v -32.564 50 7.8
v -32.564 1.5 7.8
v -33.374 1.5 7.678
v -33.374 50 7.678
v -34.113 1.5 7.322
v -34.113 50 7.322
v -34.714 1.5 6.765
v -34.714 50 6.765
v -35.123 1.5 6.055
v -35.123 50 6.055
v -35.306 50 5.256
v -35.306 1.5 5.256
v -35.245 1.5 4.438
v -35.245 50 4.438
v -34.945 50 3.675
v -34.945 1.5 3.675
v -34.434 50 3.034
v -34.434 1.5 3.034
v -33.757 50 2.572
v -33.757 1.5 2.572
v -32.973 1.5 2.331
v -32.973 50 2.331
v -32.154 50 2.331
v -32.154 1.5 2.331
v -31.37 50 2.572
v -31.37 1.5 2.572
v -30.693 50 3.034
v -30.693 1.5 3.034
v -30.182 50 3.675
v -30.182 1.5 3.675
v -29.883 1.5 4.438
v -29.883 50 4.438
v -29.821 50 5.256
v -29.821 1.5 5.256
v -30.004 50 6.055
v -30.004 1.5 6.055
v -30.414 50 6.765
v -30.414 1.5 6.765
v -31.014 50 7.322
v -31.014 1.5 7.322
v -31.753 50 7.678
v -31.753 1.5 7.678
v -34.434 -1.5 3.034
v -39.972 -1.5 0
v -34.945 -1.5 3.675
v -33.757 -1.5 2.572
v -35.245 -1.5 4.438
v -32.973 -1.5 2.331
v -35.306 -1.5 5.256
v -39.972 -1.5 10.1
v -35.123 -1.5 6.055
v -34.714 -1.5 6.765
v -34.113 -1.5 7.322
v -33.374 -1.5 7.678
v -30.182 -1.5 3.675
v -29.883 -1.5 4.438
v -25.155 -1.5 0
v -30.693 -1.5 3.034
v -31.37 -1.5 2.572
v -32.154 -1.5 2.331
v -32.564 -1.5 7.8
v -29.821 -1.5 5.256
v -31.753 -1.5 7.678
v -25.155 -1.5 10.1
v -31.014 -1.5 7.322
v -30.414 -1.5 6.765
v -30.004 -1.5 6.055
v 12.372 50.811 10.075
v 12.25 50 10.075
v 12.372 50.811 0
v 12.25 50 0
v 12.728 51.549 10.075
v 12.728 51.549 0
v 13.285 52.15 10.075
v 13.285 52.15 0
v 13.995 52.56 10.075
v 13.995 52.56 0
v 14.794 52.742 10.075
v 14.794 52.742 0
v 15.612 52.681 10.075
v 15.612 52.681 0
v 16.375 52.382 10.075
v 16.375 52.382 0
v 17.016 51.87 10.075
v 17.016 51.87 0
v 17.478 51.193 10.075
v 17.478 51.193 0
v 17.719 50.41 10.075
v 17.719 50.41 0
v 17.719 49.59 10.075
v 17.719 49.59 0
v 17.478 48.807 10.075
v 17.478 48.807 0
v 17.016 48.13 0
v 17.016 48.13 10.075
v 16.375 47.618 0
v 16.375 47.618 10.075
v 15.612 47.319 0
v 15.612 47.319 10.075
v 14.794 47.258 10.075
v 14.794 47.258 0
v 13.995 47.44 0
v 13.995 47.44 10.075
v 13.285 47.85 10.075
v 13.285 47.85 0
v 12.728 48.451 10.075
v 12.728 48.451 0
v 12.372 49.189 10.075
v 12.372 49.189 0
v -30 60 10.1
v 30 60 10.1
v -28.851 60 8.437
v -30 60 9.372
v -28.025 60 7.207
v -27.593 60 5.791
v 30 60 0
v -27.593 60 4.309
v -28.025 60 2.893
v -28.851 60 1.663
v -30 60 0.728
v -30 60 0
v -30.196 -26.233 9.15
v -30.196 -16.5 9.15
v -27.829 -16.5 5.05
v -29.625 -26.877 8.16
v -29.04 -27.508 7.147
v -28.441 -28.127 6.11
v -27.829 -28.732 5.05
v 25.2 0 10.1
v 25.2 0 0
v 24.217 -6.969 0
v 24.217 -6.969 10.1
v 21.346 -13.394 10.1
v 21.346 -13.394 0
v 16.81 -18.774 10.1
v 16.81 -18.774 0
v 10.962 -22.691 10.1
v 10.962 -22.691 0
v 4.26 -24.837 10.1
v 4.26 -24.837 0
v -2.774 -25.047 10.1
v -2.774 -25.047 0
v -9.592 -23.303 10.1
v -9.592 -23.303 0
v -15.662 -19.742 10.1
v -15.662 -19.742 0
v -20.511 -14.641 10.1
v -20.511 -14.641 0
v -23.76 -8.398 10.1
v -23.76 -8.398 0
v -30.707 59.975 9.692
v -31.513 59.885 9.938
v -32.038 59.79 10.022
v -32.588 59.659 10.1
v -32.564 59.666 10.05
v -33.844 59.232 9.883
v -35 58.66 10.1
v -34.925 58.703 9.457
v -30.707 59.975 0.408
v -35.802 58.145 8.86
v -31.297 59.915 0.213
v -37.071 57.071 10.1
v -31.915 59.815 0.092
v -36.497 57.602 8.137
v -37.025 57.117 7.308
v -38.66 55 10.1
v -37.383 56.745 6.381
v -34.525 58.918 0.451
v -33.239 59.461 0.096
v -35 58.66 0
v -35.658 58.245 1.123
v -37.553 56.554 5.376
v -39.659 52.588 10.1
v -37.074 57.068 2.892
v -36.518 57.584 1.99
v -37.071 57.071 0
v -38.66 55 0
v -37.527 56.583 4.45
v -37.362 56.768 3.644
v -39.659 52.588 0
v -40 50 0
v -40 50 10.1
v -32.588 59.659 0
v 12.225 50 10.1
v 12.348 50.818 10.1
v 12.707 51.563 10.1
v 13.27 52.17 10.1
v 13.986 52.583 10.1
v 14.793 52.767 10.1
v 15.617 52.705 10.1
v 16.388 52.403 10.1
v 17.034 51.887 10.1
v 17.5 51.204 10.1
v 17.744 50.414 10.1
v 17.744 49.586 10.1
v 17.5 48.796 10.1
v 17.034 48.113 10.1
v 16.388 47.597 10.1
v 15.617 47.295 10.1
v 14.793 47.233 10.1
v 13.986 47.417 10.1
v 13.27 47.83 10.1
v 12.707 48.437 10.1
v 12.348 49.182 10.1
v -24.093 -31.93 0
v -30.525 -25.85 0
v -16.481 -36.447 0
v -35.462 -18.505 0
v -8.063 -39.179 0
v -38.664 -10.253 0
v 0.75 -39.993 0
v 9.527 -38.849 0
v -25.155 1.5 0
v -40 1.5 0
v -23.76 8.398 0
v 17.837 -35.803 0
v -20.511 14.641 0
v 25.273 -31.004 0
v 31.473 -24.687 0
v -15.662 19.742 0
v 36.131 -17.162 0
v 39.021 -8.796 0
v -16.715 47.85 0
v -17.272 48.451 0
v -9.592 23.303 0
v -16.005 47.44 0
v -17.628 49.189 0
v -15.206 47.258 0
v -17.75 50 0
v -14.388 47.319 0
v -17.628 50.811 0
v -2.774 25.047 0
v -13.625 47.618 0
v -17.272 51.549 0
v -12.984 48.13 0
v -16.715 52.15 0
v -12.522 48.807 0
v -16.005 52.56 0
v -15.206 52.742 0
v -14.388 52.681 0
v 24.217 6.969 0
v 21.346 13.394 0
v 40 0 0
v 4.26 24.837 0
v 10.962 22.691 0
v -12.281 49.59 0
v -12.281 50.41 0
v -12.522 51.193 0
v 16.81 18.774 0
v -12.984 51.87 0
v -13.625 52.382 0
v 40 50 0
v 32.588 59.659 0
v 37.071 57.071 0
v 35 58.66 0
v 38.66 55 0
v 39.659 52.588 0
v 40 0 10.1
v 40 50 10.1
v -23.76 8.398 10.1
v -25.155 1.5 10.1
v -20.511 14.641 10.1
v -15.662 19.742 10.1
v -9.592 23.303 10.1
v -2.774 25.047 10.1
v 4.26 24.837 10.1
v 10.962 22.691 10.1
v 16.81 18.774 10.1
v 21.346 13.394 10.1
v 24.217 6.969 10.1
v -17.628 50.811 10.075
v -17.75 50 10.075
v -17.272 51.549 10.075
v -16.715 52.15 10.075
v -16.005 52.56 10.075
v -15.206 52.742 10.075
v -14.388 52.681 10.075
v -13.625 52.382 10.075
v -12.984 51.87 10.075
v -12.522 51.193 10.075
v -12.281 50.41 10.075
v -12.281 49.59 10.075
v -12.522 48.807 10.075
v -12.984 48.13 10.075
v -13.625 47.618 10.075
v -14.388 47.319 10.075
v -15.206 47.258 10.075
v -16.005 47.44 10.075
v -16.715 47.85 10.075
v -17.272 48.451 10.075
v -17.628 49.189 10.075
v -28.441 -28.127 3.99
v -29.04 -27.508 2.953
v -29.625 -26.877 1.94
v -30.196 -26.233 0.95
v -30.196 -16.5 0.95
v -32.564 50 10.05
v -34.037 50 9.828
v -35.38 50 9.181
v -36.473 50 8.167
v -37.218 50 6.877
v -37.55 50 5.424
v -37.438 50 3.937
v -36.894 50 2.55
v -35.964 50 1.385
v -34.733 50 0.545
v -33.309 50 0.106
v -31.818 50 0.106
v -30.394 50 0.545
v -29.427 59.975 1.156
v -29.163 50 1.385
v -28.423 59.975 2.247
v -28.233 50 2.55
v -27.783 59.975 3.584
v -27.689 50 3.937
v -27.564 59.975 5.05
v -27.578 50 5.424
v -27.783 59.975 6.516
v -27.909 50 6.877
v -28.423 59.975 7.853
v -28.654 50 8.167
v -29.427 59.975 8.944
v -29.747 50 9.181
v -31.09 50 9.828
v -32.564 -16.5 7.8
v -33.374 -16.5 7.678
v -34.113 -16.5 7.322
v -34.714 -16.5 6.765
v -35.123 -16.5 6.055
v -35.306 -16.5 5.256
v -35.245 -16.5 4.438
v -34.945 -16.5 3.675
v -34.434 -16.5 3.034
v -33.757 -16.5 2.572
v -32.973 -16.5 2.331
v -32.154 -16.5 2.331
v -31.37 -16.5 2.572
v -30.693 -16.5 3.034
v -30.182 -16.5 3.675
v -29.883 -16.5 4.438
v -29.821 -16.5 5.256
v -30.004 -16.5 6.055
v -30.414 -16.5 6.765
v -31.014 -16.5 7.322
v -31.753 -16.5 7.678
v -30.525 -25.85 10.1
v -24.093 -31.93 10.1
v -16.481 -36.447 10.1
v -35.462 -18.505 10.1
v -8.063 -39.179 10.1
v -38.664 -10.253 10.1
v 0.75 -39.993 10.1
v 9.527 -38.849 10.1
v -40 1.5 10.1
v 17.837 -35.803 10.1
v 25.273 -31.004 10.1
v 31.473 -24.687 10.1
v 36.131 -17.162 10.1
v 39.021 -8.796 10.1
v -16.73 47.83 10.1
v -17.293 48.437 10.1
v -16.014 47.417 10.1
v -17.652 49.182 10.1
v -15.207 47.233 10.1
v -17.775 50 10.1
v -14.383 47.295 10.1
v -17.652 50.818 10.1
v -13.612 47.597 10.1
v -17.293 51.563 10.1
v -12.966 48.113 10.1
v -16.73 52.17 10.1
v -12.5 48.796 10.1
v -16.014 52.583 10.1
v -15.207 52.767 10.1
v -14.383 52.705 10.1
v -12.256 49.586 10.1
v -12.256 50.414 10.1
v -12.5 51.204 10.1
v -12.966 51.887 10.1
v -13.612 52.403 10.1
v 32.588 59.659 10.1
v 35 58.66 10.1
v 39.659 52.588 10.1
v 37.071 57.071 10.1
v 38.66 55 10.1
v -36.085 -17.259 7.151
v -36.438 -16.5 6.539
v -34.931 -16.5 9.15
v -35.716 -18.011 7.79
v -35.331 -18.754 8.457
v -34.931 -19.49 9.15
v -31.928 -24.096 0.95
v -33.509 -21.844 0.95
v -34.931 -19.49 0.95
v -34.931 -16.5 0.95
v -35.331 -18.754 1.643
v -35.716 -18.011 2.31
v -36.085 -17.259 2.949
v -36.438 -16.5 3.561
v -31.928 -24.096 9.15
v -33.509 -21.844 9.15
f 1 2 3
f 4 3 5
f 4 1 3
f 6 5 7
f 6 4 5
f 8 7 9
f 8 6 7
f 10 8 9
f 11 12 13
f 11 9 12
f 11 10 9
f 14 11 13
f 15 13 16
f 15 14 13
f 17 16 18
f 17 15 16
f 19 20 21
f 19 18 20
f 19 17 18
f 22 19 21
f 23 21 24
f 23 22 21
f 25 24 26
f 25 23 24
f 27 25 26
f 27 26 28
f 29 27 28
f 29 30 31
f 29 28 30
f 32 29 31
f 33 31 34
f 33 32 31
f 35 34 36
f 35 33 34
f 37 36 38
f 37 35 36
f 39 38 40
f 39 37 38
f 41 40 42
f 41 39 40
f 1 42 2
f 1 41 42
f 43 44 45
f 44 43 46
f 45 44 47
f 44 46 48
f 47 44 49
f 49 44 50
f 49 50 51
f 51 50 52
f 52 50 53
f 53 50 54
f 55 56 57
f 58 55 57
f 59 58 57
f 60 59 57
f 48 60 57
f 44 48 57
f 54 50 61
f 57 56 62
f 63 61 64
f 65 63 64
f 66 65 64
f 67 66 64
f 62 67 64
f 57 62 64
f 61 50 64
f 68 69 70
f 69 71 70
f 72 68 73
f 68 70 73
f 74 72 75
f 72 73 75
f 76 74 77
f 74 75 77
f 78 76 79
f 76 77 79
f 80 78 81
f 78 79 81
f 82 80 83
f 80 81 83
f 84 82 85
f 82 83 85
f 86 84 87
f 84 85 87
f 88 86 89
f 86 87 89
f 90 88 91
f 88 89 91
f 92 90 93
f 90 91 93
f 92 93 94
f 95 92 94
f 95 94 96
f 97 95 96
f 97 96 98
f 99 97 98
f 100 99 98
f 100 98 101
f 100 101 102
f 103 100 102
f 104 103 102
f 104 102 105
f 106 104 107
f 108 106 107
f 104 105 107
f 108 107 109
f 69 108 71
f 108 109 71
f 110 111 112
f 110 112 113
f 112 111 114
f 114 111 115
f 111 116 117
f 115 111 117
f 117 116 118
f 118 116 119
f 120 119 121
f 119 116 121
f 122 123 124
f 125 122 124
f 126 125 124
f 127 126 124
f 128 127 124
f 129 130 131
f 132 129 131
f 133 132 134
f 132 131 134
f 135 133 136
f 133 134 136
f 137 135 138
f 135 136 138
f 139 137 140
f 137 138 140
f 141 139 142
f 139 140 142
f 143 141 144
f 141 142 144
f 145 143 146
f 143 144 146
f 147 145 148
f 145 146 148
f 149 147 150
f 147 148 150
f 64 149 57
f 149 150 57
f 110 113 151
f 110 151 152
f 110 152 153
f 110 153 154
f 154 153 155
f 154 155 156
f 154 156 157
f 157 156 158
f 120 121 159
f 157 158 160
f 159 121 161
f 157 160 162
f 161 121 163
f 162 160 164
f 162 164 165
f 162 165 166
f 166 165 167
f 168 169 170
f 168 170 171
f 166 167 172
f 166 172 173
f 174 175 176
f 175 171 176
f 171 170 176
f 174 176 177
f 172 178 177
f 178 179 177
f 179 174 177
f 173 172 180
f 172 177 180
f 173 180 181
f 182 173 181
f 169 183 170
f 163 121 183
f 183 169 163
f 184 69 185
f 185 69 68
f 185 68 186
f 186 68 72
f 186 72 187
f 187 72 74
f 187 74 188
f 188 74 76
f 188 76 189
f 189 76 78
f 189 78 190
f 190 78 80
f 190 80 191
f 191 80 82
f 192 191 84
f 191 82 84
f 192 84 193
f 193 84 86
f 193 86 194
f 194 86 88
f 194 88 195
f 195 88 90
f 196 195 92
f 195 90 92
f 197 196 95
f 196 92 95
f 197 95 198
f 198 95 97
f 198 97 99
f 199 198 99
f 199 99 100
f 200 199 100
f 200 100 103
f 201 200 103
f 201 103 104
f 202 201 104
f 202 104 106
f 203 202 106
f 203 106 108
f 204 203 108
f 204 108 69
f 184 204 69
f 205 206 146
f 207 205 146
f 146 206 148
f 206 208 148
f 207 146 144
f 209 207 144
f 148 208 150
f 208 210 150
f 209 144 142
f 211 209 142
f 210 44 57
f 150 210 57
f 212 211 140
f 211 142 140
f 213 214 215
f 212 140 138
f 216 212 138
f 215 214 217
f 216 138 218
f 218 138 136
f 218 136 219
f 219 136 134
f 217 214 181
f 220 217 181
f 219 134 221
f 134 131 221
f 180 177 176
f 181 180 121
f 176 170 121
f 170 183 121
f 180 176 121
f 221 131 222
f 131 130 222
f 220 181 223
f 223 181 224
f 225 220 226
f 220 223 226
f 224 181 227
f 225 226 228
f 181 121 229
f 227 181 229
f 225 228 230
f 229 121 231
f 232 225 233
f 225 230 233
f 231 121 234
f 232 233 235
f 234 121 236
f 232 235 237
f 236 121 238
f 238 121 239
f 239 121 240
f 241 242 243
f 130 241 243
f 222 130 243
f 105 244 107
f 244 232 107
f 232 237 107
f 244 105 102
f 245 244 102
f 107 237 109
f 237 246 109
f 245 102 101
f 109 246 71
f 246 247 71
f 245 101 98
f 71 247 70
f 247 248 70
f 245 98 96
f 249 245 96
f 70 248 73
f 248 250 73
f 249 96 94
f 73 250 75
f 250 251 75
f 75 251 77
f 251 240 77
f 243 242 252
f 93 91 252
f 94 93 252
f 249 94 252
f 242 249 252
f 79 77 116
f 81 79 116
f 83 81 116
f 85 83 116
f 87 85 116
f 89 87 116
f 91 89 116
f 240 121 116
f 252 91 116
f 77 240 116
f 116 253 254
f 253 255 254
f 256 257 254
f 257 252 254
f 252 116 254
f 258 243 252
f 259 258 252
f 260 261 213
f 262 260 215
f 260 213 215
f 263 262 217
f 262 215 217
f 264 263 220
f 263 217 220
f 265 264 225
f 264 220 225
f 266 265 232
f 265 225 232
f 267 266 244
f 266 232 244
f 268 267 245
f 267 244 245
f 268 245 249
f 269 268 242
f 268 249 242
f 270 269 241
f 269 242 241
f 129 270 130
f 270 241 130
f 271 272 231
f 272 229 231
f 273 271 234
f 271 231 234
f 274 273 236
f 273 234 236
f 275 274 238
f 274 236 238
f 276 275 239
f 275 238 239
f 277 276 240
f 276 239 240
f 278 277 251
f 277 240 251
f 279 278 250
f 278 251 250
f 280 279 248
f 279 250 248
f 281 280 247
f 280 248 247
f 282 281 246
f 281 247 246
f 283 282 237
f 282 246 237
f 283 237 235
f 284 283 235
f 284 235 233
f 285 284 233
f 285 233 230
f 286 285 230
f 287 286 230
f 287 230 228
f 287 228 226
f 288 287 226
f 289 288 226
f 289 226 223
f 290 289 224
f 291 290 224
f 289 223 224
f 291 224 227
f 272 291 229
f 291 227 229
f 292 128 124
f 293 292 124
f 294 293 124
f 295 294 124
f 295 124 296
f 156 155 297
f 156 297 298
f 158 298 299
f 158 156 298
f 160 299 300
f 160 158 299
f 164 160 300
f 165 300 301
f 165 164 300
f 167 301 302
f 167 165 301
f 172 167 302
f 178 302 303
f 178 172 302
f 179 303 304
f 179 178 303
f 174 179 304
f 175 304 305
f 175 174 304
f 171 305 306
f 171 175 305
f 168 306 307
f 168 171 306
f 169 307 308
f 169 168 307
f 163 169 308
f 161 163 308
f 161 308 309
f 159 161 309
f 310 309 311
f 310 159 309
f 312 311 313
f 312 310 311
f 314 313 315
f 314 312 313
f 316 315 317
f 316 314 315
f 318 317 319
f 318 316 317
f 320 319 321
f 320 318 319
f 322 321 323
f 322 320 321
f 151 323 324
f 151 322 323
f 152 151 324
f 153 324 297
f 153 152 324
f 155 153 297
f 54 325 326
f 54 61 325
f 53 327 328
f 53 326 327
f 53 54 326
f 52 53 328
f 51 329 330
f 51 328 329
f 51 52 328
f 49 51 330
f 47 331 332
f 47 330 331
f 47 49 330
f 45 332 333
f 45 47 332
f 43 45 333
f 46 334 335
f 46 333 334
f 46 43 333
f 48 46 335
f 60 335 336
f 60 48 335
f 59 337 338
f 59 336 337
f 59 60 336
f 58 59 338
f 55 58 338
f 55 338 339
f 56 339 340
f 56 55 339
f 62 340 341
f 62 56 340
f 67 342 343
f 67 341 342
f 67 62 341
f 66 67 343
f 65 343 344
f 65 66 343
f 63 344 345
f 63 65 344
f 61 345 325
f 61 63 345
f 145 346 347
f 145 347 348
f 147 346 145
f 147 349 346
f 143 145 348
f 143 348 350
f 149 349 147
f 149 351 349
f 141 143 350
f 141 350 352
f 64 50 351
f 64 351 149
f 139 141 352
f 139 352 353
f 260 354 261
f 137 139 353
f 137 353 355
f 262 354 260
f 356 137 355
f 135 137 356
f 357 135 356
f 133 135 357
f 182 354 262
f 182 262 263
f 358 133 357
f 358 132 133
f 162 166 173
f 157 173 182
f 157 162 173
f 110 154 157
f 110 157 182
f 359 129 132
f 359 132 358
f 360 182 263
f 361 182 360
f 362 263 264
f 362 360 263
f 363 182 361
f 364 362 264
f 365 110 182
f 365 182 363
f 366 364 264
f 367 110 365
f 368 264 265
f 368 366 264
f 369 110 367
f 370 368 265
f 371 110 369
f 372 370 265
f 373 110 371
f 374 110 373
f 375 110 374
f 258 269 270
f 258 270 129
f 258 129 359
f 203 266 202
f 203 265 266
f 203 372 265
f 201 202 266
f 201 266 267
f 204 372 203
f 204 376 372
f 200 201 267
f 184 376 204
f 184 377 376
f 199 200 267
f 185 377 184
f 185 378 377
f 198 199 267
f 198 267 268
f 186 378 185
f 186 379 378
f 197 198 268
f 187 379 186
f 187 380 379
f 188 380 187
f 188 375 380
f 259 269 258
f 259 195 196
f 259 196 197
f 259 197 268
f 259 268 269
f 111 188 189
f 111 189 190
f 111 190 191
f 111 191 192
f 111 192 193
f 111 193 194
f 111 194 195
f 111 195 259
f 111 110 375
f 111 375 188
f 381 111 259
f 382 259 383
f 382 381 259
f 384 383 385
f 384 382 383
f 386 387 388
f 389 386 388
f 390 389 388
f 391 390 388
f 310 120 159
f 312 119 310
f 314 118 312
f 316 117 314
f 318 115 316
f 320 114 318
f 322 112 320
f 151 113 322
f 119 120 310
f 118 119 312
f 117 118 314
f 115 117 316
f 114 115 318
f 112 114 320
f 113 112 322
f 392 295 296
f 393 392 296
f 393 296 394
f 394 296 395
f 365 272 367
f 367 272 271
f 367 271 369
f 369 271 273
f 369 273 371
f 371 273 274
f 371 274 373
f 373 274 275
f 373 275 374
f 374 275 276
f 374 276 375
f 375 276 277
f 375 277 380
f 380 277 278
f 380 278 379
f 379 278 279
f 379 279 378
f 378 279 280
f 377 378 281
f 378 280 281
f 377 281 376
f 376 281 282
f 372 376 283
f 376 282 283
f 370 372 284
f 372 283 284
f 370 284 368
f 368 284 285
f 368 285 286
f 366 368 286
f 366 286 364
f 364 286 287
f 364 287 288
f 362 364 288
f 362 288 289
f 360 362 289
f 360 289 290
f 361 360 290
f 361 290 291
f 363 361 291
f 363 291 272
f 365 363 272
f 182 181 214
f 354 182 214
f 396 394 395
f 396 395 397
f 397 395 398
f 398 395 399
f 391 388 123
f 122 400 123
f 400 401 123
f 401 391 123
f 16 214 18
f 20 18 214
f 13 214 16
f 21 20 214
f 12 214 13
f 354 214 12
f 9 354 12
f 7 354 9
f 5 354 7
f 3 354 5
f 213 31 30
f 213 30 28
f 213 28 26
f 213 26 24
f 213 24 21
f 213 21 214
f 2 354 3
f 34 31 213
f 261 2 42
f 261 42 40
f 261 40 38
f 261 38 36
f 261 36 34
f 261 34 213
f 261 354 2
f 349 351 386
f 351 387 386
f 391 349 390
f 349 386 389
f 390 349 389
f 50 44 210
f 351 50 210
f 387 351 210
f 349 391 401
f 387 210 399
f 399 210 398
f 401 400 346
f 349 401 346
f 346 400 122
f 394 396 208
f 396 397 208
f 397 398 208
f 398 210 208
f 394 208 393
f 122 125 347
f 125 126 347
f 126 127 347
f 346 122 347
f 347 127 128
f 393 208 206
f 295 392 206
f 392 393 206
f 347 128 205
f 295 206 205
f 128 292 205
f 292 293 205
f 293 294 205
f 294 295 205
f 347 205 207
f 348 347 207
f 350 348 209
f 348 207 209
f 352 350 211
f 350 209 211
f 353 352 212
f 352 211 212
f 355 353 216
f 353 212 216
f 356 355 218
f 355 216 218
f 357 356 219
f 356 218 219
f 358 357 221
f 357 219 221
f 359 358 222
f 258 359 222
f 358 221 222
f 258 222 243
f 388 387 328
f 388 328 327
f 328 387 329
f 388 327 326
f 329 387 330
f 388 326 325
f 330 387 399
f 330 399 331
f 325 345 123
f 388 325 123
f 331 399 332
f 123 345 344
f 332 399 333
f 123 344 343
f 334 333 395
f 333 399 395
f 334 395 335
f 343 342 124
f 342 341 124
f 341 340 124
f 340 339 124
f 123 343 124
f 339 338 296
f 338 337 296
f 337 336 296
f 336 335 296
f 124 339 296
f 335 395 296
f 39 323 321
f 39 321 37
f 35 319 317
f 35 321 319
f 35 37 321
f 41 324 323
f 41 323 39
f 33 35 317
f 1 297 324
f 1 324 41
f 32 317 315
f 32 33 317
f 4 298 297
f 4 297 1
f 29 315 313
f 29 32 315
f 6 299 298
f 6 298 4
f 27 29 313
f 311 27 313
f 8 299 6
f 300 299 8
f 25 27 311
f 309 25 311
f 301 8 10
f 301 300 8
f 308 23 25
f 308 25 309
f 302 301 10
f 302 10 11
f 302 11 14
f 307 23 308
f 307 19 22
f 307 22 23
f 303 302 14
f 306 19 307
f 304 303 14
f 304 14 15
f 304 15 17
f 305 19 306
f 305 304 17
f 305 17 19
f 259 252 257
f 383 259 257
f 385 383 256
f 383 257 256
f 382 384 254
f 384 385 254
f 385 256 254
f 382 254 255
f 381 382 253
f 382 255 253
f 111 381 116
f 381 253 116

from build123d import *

# Parameters (mm, degrees)
BOSS_EXTRUDE1_DEPTH            = 10.1
SKETCH3_W                      = 14.844682471
SKETCH3_H                      = 3
CUT_EXTRUDE1_DEPTH             = 73.814902321
M5_CLEARANCE_HOLE1_D           = 5.5
M5_CLEARANCE_HOLE1_CSINK_D     = 5.55
M5_CLEARANCE_HOLE1_CSINK_ANGLE = 90
FILLET1_R                      = 10
CUT_EXTRUDE2_DEPTH             = 87.915246219


with BuildPart() as part:
    # Sketch2 → Boss-Extrude1 (new body)
    with BuildSketch(Plane.XY):
        with BuildLine():
            Line((-40, 60), (-40, 0))
            ThreePointArc((-40, 0), (0, 40), (40, 0))
            Line((40, 0), (40, 60))
            Line((40, 60), (-40, 60))
        make_face()
        with BuildLine():
            ThreePointArc((40, 0), (0, 40), (-40, 0))
            Line((-40, 0), (-25.2, 0))
            ThreePointArc((-25.2, 0), (0, 25.2), (25.2, 0))
            Line((25.2, 0), (40, 0))
        make_face()
        with BuildLine():
            Line((-25.2, 0), (-40, 0))
            ThreePointArc((-40, 0), (0, -40), (40, 0))
            Line((40, 0), (25.2, 0))
            ThreePointArc((25.2, 0), (0, -25.2), (-25.2, 0))
        make_face()
    extrude(amount=BOSS_EXTRUDE1_DEPTH)

    # Sketch3 → Cut-Extrude1 (cut, through all)
    with BuildSketch(Plane.XY.offset(10.1)):
        with Locations((-32.577658765, 0)):
            Rectangle(SKETCH3_W, SKETCH3_H)
    extrude(amount=-CUT_EXTRUDE1_DEPTH, mode=Mode.SUBTRACT)

    # Sketch10 → CBORE for M5 SHCS3 (revolve, cut)
    with BuildSketch(Plane(origin=(-32.563591317, 60, 5.05), x_dir=(0, 0, 1), z_dir=(1, 0, 0))):
        Polygon((0, 0), (0, 100), (2.75, 100), (2.75, 10), (5, 10), (5, 0.025), (5.025, 0), align=None)
    revolve(axis=Axis((-32.563591317, 66.35, 5.05), (0, -1, 0)), mode=Mode.SUBTRACT)

    # M5 Clearance Hole1 (through all)
    with Locations(Plane.XY.offset(10.1)):
        with Locations((-15, 50), (15, 50)):
            CounterSinkHole(M5_CLEARANCE_HOLE1_D / 2, M5_CLEARANCE_HOLE1_CSINK_D / 2, counter_sink_angle=M5_CLEARANCE_HOLE1_CSINK_ANGLE)

    # Fillet1
    # the kernel refuses this fillet: 10 mm, written as the material it takes off along each edge
    with BuildSketch(Plane(origin=(-40, 60, -25), x_dir=(0, -1, 0), z_dir=(0, 0, 1))) as fillet1_piece_1:
        with BuildLine():
            CenterArc((FILLET1_R, FILLET1_R), FILLET1_R, 180, 90)
            Line((0, FILLET1_R), (0, 0))
            Line((0, 0), (FILLET1_R, 0))
        make_face()
    extrude(amount=60.1, mode=Mode.SUBTRACT)
    with BuildSketch(Plane(origin=(40, 60, -25), x_dir=(0, -1, 0), z_dir=(0, 0, 1))) as fillet1_piece_2:
        with BuildLine():
            CenterArc((FILLET1_R, -FILLET1_R), FILLET1_R, 90, 90)
            Line((0, -FILLET1_R), (0, 0))
            Line((0, 0), (FILLET1_R, 0))
        make_face()
    extrude(amount=60.1, mode=Mode.SUBTRACT)

    # Sketch18 → Cut-Extrude2 (cut, through all)
    with BuildSketch(Plane(origin=(0, -16.5, 0), x_dir=(1, 0, 0), z_dir=(0, 1, 0))):
        Polygon((-27.82931911, -5.05), (-30.196455214, -0.95), (-34.930727421, -0.95), (-37.297863525, -5.05), (-34.930727421, -9.15), (-30.196455214, -9.15), align=None)
    extrude(amount=-CUT_EXTRUDE2_DEPTH, mode=Mode.SUBTRACT)


solid = part.part
